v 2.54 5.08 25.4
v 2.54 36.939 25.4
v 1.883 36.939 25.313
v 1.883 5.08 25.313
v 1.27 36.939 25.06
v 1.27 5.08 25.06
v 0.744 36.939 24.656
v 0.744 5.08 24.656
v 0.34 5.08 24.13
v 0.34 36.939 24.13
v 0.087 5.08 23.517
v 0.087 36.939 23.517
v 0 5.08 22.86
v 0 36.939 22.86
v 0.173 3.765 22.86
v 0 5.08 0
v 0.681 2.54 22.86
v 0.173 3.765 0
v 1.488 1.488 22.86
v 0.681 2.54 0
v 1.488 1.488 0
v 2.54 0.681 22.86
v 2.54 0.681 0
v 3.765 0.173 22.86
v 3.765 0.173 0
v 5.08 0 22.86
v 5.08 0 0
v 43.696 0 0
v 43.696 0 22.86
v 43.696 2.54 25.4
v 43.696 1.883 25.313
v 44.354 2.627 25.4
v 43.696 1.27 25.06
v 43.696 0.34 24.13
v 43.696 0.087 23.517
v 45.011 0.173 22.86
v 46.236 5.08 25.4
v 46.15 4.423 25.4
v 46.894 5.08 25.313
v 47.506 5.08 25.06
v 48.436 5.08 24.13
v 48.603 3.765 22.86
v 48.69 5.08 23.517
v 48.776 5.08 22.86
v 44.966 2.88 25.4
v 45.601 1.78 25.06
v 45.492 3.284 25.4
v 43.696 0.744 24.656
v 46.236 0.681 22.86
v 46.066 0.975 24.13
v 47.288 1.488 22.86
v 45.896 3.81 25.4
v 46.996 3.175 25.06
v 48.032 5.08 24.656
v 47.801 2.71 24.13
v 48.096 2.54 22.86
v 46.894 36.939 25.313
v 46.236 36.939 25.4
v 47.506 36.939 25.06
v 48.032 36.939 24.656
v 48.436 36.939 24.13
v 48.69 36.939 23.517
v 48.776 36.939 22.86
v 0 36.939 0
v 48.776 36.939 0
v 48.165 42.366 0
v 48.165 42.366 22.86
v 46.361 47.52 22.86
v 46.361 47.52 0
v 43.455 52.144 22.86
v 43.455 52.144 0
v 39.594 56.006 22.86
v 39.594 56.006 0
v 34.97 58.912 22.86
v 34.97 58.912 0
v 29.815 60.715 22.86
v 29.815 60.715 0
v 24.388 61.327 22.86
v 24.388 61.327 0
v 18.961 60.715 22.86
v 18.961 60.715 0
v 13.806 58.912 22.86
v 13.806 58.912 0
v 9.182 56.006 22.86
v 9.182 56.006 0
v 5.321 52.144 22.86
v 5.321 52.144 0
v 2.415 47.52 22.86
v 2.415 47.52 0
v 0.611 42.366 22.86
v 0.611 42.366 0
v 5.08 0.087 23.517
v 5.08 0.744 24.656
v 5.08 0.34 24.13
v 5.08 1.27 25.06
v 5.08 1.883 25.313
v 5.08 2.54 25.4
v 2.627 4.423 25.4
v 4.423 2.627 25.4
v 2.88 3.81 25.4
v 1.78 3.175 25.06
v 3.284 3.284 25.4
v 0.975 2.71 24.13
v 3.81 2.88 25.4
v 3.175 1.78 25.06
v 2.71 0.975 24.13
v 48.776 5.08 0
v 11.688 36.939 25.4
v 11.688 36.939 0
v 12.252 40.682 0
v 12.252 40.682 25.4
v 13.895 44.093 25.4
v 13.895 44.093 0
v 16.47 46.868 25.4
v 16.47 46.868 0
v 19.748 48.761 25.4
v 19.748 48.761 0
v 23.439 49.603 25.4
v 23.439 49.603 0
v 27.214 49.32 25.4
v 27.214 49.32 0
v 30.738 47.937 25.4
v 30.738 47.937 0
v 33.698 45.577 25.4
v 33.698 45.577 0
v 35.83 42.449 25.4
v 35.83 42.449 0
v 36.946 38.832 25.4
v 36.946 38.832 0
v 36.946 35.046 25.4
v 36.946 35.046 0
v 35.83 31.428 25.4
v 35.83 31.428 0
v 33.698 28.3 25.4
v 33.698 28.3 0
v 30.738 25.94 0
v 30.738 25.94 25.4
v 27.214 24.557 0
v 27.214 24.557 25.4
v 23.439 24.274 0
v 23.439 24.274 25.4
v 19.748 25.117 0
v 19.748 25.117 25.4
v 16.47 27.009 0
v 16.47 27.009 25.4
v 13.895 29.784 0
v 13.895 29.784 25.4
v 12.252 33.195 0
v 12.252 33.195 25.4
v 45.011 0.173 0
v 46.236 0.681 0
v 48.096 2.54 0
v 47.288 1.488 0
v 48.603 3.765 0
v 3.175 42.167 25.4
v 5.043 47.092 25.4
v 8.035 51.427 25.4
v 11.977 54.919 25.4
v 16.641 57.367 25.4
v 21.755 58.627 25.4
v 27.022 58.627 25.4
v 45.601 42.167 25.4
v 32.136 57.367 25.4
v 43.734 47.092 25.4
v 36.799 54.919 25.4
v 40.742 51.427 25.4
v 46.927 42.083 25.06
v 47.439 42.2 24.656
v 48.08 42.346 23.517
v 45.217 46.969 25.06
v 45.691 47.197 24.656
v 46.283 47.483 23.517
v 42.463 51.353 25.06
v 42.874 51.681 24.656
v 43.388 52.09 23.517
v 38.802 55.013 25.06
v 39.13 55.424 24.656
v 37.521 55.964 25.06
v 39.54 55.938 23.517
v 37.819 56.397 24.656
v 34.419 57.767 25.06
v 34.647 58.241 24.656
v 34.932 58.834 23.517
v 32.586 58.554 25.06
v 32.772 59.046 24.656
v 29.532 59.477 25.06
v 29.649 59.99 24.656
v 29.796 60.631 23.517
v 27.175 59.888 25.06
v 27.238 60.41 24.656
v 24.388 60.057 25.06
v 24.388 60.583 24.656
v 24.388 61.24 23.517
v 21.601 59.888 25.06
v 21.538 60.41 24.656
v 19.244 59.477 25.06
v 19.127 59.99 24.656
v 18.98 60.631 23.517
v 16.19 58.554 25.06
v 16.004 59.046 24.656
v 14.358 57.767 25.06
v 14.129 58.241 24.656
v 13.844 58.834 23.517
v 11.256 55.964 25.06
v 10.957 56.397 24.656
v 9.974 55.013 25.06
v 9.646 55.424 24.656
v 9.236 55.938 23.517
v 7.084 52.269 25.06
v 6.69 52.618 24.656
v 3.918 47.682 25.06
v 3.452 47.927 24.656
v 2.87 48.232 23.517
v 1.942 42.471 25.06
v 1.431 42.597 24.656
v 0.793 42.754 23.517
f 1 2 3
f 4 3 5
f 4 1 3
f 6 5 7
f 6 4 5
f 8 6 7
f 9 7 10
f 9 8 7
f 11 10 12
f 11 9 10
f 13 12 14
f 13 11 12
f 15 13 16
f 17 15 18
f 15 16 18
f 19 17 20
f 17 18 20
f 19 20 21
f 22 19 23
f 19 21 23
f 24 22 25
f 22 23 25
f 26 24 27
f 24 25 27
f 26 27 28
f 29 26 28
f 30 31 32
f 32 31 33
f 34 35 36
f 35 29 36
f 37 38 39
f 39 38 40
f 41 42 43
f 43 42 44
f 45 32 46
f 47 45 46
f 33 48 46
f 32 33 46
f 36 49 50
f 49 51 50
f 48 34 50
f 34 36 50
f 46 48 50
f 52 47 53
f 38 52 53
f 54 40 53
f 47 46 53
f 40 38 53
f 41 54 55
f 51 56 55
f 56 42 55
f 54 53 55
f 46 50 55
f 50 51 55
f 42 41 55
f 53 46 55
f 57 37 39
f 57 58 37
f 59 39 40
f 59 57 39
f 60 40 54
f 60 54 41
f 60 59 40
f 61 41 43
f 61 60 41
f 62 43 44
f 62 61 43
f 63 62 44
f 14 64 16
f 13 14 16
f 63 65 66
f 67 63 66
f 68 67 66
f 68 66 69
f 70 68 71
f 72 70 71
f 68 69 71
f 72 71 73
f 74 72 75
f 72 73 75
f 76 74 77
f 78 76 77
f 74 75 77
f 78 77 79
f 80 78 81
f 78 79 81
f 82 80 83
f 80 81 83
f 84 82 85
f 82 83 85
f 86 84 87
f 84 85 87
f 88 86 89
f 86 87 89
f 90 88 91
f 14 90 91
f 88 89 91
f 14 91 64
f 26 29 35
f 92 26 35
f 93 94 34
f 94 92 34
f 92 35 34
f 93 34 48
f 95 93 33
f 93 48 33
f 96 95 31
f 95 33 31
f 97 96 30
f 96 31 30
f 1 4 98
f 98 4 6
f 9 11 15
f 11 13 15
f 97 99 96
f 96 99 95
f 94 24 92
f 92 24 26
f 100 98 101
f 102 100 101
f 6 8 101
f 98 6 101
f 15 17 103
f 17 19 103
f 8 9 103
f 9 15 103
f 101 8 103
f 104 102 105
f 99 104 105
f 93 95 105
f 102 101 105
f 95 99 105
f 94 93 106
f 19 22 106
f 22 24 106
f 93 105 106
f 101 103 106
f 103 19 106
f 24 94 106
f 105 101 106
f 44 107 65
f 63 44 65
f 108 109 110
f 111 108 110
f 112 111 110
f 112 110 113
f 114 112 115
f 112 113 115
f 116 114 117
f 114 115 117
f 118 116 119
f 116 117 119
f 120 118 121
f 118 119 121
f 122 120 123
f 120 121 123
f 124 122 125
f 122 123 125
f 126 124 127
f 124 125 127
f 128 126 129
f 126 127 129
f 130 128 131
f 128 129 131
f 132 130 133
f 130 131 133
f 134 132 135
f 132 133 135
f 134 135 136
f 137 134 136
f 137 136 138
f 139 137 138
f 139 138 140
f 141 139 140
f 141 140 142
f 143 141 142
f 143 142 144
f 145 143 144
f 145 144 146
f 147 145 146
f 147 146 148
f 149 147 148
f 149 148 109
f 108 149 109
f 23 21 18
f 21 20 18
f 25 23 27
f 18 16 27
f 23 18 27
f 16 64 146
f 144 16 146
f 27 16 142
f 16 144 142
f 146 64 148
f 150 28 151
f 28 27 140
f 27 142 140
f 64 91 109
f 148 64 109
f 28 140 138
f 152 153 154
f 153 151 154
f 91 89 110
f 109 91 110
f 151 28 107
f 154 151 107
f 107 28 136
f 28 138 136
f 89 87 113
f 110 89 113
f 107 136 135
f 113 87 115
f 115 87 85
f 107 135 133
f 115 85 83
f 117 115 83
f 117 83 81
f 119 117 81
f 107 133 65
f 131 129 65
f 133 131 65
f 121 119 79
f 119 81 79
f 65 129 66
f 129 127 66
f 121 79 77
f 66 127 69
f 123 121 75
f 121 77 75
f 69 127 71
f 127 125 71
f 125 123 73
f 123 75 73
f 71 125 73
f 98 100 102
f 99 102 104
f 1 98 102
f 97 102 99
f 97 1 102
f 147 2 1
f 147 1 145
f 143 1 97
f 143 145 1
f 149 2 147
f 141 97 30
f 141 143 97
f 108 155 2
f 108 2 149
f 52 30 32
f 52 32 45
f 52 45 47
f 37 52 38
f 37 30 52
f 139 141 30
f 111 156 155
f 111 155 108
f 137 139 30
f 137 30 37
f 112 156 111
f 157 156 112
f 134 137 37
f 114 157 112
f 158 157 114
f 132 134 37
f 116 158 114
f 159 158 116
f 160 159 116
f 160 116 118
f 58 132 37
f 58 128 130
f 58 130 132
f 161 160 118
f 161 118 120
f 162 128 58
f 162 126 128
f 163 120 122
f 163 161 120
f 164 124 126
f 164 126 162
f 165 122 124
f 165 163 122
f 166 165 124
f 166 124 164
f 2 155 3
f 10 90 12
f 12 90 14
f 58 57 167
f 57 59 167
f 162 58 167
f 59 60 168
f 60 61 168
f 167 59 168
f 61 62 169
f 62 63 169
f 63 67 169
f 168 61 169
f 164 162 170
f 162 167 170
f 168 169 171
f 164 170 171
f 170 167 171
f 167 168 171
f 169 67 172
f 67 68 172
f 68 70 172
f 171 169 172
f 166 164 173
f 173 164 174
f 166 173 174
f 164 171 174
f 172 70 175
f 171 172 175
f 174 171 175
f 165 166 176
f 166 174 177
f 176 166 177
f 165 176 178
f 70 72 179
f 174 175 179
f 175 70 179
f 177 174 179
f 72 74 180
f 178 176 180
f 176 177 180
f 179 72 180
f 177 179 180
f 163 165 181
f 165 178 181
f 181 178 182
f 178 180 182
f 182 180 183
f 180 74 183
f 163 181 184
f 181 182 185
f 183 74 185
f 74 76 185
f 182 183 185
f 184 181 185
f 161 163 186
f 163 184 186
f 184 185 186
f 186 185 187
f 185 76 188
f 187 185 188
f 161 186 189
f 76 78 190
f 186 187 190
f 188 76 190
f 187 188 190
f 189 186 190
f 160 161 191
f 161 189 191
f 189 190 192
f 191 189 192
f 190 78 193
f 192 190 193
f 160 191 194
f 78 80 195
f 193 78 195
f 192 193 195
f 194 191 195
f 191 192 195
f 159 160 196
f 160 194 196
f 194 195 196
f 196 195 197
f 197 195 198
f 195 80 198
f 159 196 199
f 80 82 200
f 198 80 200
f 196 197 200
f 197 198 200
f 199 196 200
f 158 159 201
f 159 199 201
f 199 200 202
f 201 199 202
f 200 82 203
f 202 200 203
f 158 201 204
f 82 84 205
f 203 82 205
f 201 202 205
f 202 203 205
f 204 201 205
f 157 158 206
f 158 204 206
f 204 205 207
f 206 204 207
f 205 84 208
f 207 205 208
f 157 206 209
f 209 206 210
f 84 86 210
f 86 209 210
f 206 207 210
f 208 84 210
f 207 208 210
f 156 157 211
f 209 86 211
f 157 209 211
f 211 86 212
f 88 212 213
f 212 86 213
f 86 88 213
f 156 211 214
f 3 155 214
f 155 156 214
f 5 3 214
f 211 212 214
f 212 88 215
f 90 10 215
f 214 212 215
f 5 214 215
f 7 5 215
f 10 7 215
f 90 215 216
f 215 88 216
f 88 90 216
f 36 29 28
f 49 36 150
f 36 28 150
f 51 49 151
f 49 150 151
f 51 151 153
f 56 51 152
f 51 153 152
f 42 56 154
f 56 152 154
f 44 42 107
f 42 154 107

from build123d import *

# Parameters (mm, degrees)
F1_DEPTH    = 25.4
F3_D        = 25.4
F4_R        = 2.54
F5_T1_DEPTH = 38.1
F5_T4_ANGLE = 90
F5_T6_ANGLE = 90


# Not quite as in the source:
# - a fillet or chamfer that OpenCascade refuses, or shapes differently, is made with other operations: its cross-section is extruded or revolved along the edge and cut away or added


with BuildPart() as f1:
    # F0 (on Top) → F1 (new body)
    with BuildSketch(Plane.XY):
        with BuildLine():
            Line((0, 36.9386635721), (0, 0))
            Line((0, 0), (48.7761497498, 0))
            Line((48.7761497498, 0), (48.7761497498, 36.9386635721))
            ThreePointArc((48.7761497498, 36.9386635721), (24.3880748749, 61.326738447), (0, 36.9386635721))
        make_face()
    extrude(amount=F1_DEPTH)

    # F3 (through all)
    with Locations(Plane.XY.offset(25.4)):
        with Locations((24.3880748749, 36.9386635721)):
            Hole(F3_D / 2)

    # F4
    f4_edges = [f1.edges().sort_by_distance(p)[0] for p in [
        (24.388075, 0, 25.4),
        (48.77615, 18.469332, 25.4),
    ]]
    fillet(f4_edges, radius=F4_R)

    # F5: fillet of radius 5.08 on 2 edges, made by hand

    # F5_s2 → F5_t1 (cut)
    with BuildSketch(Plane.XY.offset(-12.7)):
        with BuildLine():
            ThreePointArc((43.6961497498, 0), (47.2882521982, 1.4878975516), (48.7761497498, 5.08))
            Line((48.7761497498, 5.08), (48.7761497498, 0))
            Line((48.7761497498, 0), (43.6961497498, 0))
        make_face()
        with BuildLine():
            ThreePointArc((0, 5.08), (1.4878975516, 1.4878975516), (5.08, 0))
            Line((5.08, 0), (0, 0))
            Line((0, 0), (0, 5.08))
        make_face()
    extrude(amount=F5_T1_DEPTH, mode=Mode.SUBTRACT)

    # F5_s3 → F5_t4 (revolve, cut)
    with BuildSketch(Plane.XZ.offset(-5.08)):
        with BuildLine():
            ThreePointArc((2.54, 25.4), (0.7439487758, 24.6560512242), (0, 22.86))
            Line((0, 22.86), (0, 25.4))
            Line((0, 25.4), (2.54, 25.4))
        make_face()
    revolve(axis=Axis((5.08, 5.08, 25.4), (0, 0, 1)), revolution_arc=F5_T4_ANGLE, mode=Mode.SUBTRACT)

    # F5_s5 → F5_t6 (revolve, cut)
    with BuildSketch(Plane.YZ.offset(43.6961497498)):
        with BuildLine():
            ThreePointArc((2.54, 25.4), (0.7439487758, 24.6560512242), (0, 22.86))
            Line((0, 22.86), (0, 25.4))
            Line((0, 25.4), (2.54, 25.4))
        make_face()
    revolve(axis=Axis((43.6961497498, 5.08, 25.4), (0, 0, 1)), revolution_arc=F5_T6_ANGLE, mode=Mode.SUBTRACT)


solid = f1.part
